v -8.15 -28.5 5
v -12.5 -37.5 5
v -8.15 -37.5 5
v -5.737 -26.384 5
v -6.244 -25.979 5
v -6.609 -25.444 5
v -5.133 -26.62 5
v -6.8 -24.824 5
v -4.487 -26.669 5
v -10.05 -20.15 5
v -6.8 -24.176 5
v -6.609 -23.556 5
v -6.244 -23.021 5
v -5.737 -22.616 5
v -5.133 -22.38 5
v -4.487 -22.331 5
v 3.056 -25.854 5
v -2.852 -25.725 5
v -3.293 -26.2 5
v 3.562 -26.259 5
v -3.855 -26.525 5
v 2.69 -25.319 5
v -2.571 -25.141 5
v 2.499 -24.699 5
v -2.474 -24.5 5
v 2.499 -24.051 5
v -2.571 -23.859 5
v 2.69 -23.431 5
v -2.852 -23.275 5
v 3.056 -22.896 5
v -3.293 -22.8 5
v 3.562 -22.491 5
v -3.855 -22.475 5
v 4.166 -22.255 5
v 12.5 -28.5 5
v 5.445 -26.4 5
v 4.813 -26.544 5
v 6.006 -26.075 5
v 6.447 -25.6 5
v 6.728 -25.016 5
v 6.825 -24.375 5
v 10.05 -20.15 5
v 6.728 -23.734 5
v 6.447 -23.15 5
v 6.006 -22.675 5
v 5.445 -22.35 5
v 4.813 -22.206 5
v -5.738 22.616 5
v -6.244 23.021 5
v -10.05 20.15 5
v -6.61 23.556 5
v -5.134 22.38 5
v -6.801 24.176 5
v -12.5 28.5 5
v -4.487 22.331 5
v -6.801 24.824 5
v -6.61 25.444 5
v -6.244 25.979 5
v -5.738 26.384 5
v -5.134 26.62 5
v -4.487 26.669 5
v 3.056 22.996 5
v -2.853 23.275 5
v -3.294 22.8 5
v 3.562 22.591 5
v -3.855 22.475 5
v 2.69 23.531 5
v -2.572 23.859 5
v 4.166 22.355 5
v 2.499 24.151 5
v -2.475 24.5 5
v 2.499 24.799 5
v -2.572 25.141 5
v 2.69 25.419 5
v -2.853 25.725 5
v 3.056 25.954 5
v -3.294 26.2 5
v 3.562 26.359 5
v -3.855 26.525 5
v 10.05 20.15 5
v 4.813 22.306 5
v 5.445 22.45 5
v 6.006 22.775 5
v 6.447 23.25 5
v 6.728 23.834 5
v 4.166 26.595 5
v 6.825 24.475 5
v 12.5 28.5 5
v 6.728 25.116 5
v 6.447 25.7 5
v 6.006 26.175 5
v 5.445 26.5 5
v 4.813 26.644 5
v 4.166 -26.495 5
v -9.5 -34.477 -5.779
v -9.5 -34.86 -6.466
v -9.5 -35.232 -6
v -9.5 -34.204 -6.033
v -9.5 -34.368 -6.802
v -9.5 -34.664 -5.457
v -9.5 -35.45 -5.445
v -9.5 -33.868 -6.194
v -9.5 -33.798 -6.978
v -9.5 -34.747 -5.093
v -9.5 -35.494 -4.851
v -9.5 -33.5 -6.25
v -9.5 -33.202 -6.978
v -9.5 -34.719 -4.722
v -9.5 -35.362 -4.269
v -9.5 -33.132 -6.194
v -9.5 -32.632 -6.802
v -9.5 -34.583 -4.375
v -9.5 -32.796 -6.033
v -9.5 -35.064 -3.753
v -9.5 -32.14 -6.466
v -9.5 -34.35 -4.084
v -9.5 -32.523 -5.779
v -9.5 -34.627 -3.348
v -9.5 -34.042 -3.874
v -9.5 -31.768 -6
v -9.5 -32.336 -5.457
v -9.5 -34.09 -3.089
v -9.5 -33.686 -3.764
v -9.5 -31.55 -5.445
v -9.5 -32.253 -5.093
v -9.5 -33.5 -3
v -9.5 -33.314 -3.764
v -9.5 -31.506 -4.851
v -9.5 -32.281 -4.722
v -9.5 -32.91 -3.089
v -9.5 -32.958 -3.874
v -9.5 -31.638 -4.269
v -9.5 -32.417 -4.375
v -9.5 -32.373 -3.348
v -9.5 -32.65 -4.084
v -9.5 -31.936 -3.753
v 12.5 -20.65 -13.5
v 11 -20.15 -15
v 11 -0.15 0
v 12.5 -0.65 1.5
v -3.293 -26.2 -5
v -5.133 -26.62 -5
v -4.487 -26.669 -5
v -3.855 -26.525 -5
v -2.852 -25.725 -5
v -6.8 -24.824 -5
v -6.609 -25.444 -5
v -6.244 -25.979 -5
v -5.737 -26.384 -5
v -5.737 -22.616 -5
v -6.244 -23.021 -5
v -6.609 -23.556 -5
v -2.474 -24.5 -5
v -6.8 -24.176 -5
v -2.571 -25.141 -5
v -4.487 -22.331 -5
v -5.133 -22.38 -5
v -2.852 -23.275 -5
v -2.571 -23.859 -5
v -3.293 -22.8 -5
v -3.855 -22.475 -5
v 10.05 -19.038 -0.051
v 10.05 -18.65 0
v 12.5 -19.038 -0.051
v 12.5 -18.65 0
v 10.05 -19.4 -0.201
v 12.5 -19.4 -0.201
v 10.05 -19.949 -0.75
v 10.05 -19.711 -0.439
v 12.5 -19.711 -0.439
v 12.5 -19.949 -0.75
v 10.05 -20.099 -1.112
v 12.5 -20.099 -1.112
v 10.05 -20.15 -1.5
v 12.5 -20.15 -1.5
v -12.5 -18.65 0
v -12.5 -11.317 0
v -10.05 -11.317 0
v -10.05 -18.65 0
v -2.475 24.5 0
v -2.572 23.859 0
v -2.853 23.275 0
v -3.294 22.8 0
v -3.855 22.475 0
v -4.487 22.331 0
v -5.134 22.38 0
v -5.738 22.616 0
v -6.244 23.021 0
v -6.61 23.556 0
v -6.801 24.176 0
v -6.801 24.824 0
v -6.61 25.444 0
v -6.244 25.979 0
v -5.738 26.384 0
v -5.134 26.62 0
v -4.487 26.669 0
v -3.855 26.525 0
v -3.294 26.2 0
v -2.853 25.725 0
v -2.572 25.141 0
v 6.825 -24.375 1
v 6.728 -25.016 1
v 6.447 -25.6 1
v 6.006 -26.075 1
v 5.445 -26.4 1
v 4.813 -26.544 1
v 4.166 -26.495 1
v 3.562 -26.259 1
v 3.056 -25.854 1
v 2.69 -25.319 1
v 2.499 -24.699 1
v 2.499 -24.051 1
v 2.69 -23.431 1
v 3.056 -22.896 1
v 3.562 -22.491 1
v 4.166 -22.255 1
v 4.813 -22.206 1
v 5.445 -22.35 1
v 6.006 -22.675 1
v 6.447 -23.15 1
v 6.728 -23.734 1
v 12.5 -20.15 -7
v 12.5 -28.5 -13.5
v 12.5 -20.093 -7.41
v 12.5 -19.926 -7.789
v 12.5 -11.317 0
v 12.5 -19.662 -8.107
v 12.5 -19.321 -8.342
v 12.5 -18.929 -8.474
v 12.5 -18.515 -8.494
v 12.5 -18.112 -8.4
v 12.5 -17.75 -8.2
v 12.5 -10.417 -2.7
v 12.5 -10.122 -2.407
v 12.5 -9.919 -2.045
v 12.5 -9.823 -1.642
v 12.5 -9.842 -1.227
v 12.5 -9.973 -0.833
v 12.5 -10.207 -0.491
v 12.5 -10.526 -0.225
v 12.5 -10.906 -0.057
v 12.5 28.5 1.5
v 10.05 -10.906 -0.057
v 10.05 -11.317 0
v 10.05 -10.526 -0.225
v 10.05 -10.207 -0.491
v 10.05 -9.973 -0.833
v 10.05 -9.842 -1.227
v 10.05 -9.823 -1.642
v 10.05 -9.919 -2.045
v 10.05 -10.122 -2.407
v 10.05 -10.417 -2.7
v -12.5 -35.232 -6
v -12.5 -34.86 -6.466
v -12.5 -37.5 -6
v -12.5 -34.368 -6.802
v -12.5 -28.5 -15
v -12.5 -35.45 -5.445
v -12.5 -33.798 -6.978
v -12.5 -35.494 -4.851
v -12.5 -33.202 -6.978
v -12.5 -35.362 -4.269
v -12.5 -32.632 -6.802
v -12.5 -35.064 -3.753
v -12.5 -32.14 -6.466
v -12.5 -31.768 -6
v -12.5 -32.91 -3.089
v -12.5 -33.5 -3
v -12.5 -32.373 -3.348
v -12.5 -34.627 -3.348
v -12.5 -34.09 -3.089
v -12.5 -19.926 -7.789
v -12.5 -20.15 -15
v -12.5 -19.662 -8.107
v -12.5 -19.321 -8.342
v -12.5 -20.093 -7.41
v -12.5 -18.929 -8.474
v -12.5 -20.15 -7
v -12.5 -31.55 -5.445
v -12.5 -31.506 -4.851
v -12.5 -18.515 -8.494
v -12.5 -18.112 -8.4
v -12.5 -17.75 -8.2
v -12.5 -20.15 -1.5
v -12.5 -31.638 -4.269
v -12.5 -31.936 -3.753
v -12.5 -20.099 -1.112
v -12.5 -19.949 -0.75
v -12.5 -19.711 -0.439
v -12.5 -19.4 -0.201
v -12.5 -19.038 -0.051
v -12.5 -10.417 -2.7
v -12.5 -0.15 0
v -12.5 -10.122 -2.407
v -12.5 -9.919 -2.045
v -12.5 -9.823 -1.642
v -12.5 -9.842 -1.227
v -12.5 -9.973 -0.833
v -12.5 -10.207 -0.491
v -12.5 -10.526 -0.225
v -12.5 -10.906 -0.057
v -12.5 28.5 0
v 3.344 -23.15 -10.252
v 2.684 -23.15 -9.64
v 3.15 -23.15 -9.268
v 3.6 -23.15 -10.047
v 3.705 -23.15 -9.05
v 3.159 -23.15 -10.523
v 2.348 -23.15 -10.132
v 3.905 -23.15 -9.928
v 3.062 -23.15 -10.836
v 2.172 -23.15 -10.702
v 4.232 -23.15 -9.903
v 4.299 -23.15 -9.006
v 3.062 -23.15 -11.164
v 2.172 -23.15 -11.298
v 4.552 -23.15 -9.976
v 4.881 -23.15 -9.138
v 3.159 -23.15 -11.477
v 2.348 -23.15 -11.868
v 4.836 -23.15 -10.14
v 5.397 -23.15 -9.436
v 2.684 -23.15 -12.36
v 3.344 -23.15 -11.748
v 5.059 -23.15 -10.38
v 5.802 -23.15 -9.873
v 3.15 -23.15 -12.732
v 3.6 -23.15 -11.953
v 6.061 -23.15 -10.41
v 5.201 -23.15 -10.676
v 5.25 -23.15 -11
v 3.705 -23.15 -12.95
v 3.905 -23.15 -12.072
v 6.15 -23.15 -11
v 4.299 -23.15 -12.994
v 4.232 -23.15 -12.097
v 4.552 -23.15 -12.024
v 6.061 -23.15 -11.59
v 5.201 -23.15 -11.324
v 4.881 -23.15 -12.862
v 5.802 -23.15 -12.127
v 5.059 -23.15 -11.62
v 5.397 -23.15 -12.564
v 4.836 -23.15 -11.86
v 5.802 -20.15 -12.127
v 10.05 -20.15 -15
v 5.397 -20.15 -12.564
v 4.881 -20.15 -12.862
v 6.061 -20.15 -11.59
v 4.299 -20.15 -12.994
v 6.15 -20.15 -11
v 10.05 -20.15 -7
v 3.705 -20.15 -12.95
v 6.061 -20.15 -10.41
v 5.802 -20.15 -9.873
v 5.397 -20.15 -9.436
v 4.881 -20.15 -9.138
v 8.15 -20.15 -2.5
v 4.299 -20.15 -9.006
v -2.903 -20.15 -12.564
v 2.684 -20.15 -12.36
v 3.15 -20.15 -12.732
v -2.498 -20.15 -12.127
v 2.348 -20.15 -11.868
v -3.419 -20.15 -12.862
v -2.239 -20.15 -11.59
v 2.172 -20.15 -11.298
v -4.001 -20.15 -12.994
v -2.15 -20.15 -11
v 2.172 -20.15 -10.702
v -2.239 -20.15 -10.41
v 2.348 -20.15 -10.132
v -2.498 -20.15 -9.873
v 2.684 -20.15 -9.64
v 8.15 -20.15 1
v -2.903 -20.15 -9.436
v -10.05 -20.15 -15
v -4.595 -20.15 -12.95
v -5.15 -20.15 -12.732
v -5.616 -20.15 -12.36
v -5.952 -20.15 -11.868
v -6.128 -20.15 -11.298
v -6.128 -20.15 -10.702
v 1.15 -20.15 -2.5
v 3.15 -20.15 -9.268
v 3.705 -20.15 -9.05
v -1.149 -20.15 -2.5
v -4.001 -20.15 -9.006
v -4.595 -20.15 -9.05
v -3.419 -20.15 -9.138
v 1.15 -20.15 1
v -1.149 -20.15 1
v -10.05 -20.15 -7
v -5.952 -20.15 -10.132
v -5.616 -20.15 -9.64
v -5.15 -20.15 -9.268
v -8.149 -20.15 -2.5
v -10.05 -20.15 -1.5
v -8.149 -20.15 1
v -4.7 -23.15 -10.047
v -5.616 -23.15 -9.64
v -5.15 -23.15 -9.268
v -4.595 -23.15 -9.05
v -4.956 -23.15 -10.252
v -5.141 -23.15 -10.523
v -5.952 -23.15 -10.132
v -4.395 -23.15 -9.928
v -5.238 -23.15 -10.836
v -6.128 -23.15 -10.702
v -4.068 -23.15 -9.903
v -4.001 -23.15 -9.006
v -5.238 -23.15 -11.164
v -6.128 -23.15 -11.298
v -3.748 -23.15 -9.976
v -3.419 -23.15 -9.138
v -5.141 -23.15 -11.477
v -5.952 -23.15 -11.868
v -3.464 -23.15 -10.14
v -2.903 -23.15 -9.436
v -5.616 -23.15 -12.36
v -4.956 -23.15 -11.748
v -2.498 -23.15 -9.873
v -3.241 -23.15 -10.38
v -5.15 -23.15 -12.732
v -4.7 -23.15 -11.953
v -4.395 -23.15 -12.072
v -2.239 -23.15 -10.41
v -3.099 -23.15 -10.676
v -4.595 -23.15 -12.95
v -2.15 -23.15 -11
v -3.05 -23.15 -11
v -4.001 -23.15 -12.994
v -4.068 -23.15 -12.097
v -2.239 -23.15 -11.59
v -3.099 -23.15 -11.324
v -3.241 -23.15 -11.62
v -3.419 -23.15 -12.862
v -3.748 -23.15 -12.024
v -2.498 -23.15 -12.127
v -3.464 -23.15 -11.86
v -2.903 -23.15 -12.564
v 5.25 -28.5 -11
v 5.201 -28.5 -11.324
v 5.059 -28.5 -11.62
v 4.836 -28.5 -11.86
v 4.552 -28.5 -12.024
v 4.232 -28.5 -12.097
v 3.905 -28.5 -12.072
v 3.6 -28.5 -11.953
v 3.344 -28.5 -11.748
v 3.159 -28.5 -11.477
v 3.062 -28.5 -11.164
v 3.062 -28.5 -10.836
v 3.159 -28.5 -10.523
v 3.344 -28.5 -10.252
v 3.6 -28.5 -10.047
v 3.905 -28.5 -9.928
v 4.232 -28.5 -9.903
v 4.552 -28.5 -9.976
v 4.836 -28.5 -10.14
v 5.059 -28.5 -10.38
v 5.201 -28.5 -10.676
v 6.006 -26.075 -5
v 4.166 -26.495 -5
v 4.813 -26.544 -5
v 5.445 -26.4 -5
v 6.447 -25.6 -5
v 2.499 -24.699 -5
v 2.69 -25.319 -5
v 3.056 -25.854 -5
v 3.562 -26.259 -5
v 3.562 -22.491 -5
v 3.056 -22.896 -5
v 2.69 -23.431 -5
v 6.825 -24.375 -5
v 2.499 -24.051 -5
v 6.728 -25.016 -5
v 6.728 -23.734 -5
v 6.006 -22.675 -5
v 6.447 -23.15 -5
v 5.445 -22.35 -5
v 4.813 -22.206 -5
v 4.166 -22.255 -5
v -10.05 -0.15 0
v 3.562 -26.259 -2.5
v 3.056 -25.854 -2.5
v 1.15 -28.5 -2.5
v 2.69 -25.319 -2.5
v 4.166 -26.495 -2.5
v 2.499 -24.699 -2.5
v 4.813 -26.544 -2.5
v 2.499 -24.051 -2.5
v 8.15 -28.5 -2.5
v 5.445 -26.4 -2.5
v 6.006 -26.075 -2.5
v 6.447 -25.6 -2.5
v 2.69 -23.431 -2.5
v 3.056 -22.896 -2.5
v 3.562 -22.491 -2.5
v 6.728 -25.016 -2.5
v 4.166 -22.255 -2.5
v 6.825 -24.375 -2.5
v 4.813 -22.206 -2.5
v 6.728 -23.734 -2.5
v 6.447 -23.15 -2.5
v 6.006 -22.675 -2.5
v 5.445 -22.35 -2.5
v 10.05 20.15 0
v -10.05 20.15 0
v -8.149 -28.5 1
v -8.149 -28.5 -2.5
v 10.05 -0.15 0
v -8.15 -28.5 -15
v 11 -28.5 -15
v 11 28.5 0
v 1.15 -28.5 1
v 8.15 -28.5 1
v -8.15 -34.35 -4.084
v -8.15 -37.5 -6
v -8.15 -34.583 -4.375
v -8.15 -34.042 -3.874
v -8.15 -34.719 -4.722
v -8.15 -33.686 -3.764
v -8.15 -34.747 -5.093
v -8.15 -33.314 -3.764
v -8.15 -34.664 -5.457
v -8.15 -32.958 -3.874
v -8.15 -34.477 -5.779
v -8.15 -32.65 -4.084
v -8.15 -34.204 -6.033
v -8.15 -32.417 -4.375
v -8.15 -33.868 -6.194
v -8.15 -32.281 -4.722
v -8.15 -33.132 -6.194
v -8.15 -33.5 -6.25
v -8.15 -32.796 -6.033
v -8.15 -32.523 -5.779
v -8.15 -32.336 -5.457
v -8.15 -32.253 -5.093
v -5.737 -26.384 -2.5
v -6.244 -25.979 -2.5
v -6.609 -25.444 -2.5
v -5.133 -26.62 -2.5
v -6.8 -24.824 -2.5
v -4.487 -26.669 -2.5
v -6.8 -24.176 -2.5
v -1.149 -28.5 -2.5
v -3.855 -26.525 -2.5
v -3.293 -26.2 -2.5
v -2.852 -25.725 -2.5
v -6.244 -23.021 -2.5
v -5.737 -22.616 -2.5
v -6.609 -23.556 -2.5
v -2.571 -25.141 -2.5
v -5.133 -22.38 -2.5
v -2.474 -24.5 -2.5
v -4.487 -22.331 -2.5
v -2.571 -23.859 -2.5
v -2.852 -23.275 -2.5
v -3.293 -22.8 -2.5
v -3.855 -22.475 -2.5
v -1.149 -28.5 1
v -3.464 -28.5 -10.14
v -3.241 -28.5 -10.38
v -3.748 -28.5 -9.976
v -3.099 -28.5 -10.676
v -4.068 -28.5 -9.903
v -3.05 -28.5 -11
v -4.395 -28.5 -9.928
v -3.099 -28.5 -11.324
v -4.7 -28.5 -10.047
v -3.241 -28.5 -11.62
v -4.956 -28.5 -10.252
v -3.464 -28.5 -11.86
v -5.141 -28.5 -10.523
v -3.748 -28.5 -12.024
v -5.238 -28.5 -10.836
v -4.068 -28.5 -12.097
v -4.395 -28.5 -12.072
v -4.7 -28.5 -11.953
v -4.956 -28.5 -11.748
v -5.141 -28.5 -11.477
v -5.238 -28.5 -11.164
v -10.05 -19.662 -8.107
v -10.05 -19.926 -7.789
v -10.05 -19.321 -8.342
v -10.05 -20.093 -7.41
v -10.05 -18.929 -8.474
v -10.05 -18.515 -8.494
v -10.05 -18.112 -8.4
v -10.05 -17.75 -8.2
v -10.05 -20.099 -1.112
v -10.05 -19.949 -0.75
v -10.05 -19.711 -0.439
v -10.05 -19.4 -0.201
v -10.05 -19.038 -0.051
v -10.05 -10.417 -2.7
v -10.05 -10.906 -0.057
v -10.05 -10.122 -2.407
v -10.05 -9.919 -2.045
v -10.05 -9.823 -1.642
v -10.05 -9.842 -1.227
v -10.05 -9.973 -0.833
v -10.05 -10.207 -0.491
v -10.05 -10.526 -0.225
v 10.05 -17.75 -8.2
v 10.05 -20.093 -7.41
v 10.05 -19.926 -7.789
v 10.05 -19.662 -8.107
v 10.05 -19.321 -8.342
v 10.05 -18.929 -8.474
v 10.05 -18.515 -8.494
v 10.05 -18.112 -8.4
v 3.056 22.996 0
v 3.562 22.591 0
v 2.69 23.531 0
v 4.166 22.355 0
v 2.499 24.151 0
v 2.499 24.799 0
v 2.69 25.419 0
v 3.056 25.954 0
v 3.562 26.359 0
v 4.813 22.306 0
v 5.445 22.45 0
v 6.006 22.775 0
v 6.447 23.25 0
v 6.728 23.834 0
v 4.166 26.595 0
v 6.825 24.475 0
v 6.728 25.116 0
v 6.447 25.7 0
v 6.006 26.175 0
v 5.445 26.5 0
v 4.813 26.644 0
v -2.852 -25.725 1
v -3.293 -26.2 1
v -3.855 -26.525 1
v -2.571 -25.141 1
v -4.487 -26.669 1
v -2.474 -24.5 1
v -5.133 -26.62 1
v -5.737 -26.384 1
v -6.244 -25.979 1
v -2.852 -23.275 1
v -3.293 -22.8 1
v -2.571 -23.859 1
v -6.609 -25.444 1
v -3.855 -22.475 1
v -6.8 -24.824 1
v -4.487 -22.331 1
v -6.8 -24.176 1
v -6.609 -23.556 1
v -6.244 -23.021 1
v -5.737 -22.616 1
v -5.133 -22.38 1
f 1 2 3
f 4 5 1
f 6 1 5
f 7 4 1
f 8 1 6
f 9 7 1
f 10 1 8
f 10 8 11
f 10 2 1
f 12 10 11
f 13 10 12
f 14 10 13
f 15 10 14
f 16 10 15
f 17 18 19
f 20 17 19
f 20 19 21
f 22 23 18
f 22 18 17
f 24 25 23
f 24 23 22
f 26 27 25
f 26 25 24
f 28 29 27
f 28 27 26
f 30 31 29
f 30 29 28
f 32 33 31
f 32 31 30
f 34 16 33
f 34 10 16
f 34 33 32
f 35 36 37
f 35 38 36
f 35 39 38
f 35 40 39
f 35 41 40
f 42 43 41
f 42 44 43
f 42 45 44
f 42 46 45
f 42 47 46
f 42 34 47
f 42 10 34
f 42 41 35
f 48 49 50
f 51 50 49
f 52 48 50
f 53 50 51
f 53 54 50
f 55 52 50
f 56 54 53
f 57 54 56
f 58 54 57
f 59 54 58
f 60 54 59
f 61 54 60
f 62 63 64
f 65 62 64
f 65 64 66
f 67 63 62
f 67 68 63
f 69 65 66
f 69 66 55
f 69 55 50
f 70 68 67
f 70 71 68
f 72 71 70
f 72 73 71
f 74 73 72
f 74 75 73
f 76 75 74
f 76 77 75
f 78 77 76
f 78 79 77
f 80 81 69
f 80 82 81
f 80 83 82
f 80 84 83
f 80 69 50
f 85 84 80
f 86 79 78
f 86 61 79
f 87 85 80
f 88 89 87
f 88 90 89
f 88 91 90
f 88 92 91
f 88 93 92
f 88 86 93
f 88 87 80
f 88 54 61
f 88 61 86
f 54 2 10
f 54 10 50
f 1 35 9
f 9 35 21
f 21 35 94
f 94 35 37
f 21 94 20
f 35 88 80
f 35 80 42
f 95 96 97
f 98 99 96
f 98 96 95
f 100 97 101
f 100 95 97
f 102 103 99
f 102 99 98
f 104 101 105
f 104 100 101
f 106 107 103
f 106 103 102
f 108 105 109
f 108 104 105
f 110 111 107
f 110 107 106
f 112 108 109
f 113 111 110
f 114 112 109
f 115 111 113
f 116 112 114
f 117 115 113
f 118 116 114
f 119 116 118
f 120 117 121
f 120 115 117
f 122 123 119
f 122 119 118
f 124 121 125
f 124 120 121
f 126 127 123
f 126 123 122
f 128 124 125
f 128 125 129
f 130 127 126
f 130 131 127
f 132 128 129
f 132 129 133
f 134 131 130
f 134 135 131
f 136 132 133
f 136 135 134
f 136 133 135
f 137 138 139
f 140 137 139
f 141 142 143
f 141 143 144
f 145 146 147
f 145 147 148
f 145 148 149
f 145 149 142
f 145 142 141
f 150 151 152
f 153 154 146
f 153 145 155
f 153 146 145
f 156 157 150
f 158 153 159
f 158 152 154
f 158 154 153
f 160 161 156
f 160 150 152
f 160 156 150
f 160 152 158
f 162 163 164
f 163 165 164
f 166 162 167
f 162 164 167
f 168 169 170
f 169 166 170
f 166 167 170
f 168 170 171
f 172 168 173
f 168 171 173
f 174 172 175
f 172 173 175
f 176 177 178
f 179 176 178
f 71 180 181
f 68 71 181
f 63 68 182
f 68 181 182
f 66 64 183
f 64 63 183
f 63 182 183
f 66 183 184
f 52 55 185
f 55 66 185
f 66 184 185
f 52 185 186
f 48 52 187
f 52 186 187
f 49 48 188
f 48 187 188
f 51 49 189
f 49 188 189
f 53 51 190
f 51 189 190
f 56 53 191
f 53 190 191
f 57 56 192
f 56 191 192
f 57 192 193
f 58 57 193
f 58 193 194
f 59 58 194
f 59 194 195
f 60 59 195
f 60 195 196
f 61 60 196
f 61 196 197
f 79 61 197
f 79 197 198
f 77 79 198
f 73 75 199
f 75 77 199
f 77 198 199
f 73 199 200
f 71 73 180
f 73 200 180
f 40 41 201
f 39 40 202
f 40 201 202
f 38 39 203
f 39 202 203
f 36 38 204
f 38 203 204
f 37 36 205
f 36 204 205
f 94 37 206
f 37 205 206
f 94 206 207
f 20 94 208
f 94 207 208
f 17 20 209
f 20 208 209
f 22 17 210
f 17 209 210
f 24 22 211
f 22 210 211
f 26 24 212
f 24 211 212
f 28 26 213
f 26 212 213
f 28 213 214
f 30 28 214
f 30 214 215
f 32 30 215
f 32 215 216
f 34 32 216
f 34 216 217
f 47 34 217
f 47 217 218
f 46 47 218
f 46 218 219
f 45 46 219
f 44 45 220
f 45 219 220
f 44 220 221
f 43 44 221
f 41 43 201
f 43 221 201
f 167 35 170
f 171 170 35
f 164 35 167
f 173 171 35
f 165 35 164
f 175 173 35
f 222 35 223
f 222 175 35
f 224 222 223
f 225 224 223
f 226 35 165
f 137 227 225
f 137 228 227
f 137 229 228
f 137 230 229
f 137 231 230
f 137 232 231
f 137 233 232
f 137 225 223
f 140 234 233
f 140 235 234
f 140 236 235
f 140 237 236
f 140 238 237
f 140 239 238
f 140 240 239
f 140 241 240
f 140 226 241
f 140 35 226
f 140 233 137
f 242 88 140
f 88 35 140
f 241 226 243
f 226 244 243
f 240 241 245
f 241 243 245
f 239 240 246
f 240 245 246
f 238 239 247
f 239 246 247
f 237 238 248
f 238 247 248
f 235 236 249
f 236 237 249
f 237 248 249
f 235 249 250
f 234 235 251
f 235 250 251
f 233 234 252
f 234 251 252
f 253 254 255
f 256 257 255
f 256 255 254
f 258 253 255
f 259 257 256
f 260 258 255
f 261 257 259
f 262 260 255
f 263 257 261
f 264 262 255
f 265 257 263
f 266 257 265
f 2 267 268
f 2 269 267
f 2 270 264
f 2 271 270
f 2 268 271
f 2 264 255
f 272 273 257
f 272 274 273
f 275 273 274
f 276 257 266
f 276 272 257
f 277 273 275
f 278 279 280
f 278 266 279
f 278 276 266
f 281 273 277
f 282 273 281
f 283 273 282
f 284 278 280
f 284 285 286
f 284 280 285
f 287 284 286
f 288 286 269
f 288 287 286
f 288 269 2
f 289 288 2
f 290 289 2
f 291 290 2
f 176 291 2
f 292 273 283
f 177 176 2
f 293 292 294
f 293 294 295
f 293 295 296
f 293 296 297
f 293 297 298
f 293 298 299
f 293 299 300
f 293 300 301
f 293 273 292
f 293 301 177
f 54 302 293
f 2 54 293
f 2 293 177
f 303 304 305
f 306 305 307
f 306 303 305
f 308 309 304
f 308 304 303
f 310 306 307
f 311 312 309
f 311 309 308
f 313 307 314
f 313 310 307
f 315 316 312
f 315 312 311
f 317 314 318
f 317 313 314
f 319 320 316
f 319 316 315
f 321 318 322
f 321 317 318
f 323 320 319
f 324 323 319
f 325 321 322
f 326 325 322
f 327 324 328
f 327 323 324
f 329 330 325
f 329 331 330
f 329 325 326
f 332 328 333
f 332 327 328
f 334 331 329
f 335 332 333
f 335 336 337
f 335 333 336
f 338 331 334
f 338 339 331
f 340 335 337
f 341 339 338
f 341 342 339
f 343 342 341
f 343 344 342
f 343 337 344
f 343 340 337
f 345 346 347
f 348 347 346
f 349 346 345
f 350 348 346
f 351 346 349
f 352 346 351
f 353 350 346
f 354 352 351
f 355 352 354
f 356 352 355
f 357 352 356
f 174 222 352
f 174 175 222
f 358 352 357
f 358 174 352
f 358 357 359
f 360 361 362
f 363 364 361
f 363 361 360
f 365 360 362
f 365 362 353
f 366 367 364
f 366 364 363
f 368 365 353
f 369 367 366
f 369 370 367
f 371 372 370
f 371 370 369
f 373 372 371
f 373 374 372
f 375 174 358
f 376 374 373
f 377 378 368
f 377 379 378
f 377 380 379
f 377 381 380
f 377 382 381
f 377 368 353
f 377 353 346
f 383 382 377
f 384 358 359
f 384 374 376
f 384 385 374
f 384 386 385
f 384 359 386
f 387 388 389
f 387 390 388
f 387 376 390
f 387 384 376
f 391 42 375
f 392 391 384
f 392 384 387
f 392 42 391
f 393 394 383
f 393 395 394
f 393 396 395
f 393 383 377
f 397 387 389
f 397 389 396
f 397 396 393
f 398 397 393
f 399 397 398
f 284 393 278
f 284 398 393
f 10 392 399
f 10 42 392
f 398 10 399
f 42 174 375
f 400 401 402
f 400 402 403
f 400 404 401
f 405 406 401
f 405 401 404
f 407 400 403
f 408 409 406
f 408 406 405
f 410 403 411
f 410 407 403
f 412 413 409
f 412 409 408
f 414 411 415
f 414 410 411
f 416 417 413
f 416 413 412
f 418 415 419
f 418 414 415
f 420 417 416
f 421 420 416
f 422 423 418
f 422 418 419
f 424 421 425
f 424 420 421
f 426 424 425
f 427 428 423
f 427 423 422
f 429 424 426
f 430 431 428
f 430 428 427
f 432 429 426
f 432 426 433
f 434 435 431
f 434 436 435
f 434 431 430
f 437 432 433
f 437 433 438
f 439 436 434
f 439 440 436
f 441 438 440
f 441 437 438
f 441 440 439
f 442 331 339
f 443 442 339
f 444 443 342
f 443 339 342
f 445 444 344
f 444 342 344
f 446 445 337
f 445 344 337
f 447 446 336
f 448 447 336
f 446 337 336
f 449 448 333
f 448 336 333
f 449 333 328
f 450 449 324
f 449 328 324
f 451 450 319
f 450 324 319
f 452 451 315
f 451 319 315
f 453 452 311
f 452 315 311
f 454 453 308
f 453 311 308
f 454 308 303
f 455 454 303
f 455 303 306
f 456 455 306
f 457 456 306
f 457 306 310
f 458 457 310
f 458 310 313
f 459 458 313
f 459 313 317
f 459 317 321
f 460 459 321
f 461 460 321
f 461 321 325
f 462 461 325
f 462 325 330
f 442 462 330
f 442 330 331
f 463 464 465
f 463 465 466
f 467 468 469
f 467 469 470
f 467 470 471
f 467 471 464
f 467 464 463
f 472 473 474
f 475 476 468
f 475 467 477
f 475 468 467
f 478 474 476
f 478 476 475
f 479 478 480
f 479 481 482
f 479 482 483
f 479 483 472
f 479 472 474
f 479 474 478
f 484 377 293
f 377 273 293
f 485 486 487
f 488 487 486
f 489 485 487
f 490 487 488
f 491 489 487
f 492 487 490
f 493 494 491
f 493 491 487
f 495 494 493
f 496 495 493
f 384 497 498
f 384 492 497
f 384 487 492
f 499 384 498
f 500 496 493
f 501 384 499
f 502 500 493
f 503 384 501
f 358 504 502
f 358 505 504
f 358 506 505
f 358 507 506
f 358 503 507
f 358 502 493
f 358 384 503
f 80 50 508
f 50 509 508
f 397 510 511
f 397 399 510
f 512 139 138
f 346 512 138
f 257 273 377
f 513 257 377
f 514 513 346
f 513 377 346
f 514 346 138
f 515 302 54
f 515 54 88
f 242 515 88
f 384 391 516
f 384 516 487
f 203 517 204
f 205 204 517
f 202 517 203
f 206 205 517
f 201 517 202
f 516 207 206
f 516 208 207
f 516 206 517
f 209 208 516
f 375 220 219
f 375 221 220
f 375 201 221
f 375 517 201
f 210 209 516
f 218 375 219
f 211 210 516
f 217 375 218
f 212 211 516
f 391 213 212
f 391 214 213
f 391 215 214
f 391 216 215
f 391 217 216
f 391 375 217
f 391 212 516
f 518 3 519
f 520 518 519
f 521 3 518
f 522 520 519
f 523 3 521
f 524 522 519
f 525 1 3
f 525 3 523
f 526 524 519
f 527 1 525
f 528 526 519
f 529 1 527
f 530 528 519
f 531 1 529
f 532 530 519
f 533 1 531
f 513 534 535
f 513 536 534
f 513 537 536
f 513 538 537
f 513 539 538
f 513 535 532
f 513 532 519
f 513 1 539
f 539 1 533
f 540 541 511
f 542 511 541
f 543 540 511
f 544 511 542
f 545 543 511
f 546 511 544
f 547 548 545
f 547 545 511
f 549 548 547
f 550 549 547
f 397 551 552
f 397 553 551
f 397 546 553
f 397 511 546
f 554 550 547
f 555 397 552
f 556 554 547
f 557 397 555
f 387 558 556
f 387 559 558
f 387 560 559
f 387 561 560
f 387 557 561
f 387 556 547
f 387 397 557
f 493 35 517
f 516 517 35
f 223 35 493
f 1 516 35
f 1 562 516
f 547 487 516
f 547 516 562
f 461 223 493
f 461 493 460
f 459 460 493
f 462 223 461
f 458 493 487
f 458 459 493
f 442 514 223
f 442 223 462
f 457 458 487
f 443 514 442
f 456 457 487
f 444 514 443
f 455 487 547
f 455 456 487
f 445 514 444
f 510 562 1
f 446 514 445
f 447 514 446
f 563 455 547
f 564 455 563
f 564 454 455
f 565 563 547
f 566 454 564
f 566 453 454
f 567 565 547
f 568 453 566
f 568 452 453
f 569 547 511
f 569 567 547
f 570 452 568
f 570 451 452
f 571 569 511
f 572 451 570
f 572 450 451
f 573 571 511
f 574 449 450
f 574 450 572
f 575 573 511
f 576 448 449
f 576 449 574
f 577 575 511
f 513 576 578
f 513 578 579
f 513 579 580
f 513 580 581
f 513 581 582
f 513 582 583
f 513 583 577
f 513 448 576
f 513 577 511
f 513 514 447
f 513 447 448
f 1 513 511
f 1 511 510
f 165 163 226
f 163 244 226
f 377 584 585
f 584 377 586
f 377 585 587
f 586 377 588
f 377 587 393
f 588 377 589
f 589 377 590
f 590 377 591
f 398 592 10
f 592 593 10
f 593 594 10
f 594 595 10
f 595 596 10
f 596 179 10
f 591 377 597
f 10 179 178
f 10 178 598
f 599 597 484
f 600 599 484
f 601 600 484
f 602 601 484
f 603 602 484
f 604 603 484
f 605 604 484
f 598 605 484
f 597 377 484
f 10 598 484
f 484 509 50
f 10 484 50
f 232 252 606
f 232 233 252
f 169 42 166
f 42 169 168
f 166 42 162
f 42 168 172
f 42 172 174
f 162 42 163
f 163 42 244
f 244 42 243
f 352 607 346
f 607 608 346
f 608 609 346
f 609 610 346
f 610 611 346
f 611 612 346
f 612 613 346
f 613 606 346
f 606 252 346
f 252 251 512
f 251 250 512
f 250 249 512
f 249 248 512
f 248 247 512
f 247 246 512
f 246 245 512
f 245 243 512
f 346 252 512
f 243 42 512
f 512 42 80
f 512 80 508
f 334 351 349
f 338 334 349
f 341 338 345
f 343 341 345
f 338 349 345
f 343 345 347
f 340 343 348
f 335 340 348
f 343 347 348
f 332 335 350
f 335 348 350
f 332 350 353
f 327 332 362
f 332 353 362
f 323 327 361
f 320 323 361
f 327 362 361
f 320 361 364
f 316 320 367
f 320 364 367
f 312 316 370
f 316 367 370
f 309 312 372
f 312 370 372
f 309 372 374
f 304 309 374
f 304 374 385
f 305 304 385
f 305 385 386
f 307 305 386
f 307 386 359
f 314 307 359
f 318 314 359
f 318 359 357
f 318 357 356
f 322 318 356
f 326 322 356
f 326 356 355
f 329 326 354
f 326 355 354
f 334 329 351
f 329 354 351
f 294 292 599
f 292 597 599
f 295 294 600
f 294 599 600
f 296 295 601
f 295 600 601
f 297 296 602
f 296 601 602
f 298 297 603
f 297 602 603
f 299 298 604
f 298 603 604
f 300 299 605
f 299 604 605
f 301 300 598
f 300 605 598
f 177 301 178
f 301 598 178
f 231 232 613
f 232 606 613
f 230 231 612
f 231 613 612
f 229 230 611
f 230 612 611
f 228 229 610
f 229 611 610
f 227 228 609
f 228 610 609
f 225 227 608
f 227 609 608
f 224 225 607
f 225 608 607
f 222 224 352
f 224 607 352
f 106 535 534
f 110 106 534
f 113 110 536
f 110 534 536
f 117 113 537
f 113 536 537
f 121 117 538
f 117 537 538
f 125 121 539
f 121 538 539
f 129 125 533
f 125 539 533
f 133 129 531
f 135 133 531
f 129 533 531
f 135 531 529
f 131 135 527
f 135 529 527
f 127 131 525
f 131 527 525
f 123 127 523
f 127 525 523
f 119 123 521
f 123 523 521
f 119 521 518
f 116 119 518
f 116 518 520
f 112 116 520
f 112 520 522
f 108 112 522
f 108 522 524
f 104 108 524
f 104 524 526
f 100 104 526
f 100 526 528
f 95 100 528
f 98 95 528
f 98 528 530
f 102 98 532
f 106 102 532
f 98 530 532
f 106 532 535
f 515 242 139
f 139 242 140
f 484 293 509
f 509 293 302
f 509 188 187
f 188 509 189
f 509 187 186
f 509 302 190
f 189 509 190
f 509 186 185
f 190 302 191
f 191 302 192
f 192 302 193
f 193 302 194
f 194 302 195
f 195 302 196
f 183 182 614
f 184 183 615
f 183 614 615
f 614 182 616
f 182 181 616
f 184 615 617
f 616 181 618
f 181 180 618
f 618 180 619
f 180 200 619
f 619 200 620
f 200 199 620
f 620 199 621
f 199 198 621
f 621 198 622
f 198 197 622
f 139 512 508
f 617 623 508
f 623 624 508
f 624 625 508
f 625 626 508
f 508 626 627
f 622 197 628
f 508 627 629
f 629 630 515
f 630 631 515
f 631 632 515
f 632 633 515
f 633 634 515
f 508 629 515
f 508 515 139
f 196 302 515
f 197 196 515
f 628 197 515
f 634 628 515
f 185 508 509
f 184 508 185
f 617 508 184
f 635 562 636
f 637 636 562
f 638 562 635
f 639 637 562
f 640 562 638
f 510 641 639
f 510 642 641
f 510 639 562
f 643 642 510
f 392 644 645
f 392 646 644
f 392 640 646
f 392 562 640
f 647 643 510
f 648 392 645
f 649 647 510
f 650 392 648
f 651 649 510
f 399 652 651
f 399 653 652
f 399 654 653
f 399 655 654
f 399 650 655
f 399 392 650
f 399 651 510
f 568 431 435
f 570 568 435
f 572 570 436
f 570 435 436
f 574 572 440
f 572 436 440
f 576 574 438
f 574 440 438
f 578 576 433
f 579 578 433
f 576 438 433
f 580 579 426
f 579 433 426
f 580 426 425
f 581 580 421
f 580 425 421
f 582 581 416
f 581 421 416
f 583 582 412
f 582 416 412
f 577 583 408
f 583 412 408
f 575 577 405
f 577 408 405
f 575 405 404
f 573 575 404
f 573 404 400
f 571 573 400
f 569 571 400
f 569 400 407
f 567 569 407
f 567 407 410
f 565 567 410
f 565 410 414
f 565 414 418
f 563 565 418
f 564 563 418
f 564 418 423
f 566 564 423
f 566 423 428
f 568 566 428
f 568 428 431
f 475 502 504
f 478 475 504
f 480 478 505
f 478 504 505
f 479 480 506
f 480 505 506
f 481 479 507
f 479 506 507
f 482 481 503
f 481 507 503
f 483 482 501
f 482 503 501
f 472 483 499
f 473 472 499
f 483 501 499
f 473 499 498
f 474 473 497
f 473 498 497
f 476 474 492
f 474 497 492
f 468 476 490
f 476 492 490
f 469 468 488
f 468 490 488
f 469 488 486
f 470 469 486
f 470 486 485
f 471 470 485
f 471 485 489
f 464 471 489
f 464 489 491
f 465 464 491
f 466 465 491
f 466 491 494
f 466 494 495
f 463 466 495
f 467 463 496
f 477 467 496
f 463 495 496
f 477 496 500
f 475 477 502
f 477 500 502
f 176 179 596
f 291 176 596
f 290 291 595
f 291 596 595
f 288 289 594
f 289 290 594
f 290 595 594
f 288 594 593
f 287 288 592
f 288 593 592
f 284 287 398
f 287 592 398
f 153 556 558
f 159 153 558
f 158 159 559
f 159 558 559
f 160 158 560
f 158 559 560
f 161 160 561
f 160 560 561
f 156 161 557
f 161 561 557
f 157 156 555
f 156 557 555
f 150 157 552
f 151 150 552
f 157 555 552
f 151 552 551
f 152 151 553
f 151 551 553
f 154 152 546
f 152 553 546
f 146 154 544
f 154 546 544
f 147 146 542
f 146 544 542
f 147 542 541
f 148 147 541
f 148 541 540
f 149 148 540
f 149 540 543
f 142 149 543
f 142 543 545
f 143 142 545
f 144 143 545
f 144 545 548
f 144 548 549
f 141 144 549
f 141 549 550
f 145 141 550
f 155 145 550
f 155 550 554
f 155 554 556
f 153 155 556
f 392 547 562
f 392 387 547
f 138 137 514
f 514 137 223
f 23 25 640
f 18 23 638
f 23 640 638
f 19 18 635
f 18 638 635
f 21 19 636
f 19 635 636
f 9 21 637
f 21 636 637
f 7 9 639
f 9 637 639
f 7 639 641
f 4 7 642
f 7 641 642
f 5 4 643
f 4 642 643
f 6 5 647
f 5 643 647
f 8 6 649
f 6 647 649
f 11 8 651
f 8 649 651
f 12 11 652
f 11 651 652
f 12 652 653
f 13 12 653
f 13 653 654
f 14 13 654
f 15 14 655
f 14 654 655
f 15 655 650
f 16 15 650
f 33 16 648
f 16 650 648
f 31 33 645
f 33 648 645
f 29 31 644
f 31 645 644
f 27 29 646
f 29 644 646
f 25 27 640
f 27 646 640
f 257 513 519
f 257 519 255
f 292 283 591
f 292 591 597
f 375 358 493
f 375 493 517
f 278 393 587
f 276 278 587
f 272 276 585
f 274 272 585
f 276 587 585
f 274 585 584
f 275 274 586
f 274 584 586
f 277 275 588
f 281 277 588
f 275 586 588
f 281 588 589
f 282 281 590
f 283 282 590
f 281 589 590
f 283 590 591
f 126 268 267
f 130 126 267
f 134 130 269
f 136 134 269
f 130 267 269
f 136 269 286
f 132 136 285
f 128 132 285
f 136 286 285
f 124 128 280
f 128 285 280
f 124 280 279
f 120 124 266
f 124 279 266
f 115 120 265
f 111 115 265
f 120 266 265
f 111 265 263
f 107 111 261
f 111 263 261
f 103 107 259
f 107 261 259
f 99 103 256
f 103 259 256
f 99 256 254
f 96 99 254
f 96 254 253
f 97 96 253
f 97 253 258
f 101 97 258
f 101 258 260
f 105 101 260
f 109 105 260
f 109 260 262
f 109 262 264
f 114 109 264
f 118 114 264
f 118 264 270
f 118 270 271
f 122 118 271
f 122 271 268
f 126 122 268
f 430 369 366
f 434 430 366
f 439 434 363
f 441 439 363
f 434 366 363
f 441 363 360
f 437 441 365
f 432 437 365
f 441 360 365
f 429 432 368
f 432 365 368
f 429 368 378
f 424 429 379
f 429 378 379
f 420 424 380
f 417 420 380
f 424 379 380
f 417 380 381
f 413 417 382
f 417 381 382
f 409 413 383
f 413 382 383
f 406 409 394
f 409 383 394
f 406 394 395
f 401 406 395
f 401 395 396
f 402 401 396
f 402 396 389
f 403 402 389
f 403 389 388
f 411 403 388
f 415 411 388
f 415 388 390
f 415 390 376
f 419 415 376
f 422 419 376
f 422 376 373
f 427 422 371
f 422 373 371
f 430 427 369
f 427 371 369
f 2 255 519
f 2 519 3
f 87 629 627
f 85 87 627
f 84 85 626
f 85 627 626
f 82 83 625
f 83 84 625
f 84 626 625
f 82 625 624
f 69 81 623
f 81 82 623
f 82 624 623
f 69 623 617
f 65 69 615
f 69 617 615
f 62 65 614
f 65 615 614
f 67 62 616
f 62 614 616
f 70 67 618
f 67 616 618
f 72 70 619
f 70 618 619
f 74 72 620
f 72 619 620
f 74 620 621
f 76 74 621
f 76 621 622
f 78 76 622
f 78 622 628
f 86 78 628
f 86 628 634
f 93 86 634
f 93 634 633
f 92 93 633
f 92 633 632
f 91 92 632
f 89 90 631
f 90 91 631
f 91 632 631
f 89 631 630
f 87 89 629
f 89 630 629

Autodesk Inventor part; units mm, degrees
ref_plane "YZ Plane" through (0, 0, 0) normal (1, 0, 0) x (0, 1, 0)
ref_plane "XZ Plane" through (0, 0, 0) normal (0, 1, 0) x (-1, 0, 0)
sketch "Sketch1" plane through (0, 0, 0) normal (0, 0, 1) x (1, 0, 0)
  line L0 (-12.5, 28.5) -> (12.5, 28.5)
  line L1 (12.5, 28.5) -> (12.5, -28.5)
  line L2 (12.5, -28.5) -> (-12.5, -28.5)
  line L3 (-12.5, -28.5) -> (-12.5, 28.5)
  line L4 (-10.05, 20.15) -> (10.05, 20.15)
  line L5 (10.05, 20.15) -> (10.05, -20.15)
  line L6 (10.05, -20.15) -> (-10.05, -20.15)
  line L7 (-10.05, -20.15) -> (-10.05, 20.15)
  line L8 (0, 0) -> (0, 17.7516) construction
  line L9 (0, 0) -> (17.0454, 0) construction
  line L10 (-12.5, -28.5) -> (12.5, -28.5)
  line L11 (12.5, -28.5) -> (12.5, -20.15)
  line L12 (12.5, -20.15) -> (-12.5, -20.15)
  line L13 (-12.5, -20.15) -> (-12.5, -28.5)
  circle A0 centre (-4.65, 24.5) radius 2.175
  circle A1 centre (4.65, 24.475) radius 2.175
  circle A2 centre (-4.6492, -24.5) radius 2.175
  circle A3 centre (4.65, -24.375) radius 2.175
  point P0 (12.5, -24.325)
  dimension "d0" = 40.3
  dimension "d1" = 20.1
  dimension "d2" = 57
  dimension "d3" = 25
  dimension "d4" = 4.35
  dimension "d5" = 4.325
  dimension "d6" = 4.35
  dimension "d8" = 4.35
  dimension "d9" = 5.4
  dimension "d13" = 5.4
  dimension "d28" = 48.85
  dimension "d29" = 9.3
  dimension "d30" = 9.3
extrude "Extrusion1" add sketch "Sketch1" along normal blind 5 contours L0 L1 L12 L5 L4 L7 L3 | L12 L6 L1 L2 L3
extrude "Extrusion2" add sketch "Sketch1" against normal blind 15 contours L12 L6 L1 L2 L3 | A2 | A3
extrude "Extrusion3" cut sketch "Sketch1" against normal blind 10 from surface at 5 contours A2 | A3
sketch "Sketch2" plane through (-10.05, -20.15, 5) normal (0, 1, 0) x (1, 0, 0)
  circle A0 centre (5.9, 16) radius 1.1
  circle A1 centre (14.2, 16) radius 1.1
  line L0 (0, 0) -> (20.1, 0) construction
  line L1 (10.05, 0) -> (10.05, 23.167) construction
  line L2 (-2.45, 20) -> (22.55, 20) projected
  circle A2 centre (14.2, 16) radius 2
  circle A3 centre (5.9, 16) radius 2
  point P0 (10.05, 5)
  dimension "d20" = 2.2
  dimension "d21" = 8.3
  dimension "d22" = 4
  dimension "d23" = 4
extrude "Extrusion4" cut sketch "Sketch2" against normal blind 10 contours A0 | A1
extrude "Extrusion5" cut sketch "Sketch2" against normal blind 3 contours A0 | A1 | A2 | A3
sketch "Sketch3" plane through (12.5, -20.15, 0) normal (1, 0, 0) x (0, 0, -1)
  line L0 (0, 48.65) -> (-5, 48.65) construction
  line L1 (-5, 48.65) -> (38.6712, 48.65) construction
  line L2 (0, 0) -> (-5, 0) construction
  line L3 (-5, 0) -> (38.6712, 0) construction
  line L4 (0, 20) -> (15, 0)
  line L5 (0, 20) -> (0, 13.3333)
  line L6 (0, 13.3333) -> (10, 0)
  line L7 (10, 0) -> (15, 0)
  line L8 (15, 0) -> (15, -8.35) construction
  line L9 (15, -0.9137) -> (15, 2.4866) construction
  line L10 (-5, 0) -> (15, 0)
  line L11 (15, 0) -> (15, -17.35)
  line L12 (15, -17.35) -> (-5, -17.35)
  line L13 (-5, -17.35) -> (-5, 0)
  circle A0 centre (5, -13.35) radius 1.25
  line L14 (0, 0) -> (0, 48.65) projected
  line L15 (0, 48.65) -> (0, 0) projected
  line L16 (0, 0) -> (15, 0) projected
  line L17 (15, -8.35) -> (15, 0) projected
  line L18 (15, -8.35) -> (-5, -8.35) projected
  line L19 (-5, 48.65) -> (-5, -8.35) projected
  line L20 (0, 48.65) -> (-5, 48.65) projected
  point P0 (0, 20.15)
  dimension "d31" = 4
  dimension "d39" = 2.5
  dimension "d41" = 10
  dimension "d46" = 5
  dimension "d59" = 9
  dimension "d63" = 20
extrude "Extrusion6" add sketch "Sketch3" against normal up to surface (2.45 mm away) contours L4 L7 L6 L5
extrude "Extrusion7" add sketch "Sketch3" along normal blind 4.35 from surface at -25 contours L11 L18 L13 L10 L7 | L11 L12 L13 L18 | A0
extrude "Extrusion8" cut sketch "Sketch3" against normal blind 35.65 contours A0
ref_plane "Work Plane2" through (0, -28.5, 5) normal (1, 0, 0) x (0, 0, -1)
mirror "Mirror1" about plane through (0, -28.5, 5) normal (1, 0, 0) of "Extrusion6"
fillet "Fillet1" radius 1.5 6 edges at (11.275, -20.15, 0) (11.275, -6.8167, 0) (11.275, -20.15, -10) (-11.275, -20.15, -10) (-11.275, -6.8167, 0) (-11.275, -20.15, 0)
chamfer "Chamfer1" distance 1.5 angle 45 3 edges at (12.5, -24.325, -15) (12.5, -10.15, -7.5) (12.5, 14.175, 0)
sketch "Sketch4" plane through (-12.5, 28.5, 0) normal (-1, 0, 0) x (0, 0, 1)
  circle A0 centre (-5, -62) radius 1.25 projected
  circle A1 centre (-5, -62) radius 2
  point P0 (0, -28.5)
  dimension "d51" = 4
extrude "Extrusion9" cut sketch "Sketch4" against normal blind 3
sketch "Sketch5" plane through (-10.05, -20.15, 5) normal (0, 1, 0) x (1, 0, 0)
  line L0 (1.9008, 7.5) -> (8.9008, 7.5)
  line L1 (8.9008, 7.5) -> (8.9008, 4)
  line L2 (8.9008, 4) -> (1.9008, 4)
  line L3 (1.9008, 4) -> (1.9008, 7.5)
  line L4 (11.2, 7.5) -> (18.2, 7.5)
  line L5 (18.2, 7.5) -> (18.2, 4)
  line L6 (18.2, 4) -> (11.2, 4)
  line L7 (11.2, 4) -> (11.2, 7.5)
  line L8 (22.55, 0) -> (-2.45, 0) projected
  line L9 (5.4008, 4) -> (5.4008, 0) construction
  line L10 (14.7, 4) -> (14.7, 0) construction
  line L11 (7.5758, 0) -> (3.2258, 0) construction
  line L12 (16.875, 0) -> (12.525, 0) construction
  dimension "d54" = 7
  dimension "d55" = 3.5
  dimension "d56" = 4
extrude "Extrusion10" cut sketch "Sketch5" against normal blind 10
chamfer "Chamfer2" distance 9 angle 45 1 edges at (-10.325, -37.5, -15)
equation "\"d8\" = d6"
equation "\"d13\" = d9"
properties part number "BIGServoHolder_3DPrint"
